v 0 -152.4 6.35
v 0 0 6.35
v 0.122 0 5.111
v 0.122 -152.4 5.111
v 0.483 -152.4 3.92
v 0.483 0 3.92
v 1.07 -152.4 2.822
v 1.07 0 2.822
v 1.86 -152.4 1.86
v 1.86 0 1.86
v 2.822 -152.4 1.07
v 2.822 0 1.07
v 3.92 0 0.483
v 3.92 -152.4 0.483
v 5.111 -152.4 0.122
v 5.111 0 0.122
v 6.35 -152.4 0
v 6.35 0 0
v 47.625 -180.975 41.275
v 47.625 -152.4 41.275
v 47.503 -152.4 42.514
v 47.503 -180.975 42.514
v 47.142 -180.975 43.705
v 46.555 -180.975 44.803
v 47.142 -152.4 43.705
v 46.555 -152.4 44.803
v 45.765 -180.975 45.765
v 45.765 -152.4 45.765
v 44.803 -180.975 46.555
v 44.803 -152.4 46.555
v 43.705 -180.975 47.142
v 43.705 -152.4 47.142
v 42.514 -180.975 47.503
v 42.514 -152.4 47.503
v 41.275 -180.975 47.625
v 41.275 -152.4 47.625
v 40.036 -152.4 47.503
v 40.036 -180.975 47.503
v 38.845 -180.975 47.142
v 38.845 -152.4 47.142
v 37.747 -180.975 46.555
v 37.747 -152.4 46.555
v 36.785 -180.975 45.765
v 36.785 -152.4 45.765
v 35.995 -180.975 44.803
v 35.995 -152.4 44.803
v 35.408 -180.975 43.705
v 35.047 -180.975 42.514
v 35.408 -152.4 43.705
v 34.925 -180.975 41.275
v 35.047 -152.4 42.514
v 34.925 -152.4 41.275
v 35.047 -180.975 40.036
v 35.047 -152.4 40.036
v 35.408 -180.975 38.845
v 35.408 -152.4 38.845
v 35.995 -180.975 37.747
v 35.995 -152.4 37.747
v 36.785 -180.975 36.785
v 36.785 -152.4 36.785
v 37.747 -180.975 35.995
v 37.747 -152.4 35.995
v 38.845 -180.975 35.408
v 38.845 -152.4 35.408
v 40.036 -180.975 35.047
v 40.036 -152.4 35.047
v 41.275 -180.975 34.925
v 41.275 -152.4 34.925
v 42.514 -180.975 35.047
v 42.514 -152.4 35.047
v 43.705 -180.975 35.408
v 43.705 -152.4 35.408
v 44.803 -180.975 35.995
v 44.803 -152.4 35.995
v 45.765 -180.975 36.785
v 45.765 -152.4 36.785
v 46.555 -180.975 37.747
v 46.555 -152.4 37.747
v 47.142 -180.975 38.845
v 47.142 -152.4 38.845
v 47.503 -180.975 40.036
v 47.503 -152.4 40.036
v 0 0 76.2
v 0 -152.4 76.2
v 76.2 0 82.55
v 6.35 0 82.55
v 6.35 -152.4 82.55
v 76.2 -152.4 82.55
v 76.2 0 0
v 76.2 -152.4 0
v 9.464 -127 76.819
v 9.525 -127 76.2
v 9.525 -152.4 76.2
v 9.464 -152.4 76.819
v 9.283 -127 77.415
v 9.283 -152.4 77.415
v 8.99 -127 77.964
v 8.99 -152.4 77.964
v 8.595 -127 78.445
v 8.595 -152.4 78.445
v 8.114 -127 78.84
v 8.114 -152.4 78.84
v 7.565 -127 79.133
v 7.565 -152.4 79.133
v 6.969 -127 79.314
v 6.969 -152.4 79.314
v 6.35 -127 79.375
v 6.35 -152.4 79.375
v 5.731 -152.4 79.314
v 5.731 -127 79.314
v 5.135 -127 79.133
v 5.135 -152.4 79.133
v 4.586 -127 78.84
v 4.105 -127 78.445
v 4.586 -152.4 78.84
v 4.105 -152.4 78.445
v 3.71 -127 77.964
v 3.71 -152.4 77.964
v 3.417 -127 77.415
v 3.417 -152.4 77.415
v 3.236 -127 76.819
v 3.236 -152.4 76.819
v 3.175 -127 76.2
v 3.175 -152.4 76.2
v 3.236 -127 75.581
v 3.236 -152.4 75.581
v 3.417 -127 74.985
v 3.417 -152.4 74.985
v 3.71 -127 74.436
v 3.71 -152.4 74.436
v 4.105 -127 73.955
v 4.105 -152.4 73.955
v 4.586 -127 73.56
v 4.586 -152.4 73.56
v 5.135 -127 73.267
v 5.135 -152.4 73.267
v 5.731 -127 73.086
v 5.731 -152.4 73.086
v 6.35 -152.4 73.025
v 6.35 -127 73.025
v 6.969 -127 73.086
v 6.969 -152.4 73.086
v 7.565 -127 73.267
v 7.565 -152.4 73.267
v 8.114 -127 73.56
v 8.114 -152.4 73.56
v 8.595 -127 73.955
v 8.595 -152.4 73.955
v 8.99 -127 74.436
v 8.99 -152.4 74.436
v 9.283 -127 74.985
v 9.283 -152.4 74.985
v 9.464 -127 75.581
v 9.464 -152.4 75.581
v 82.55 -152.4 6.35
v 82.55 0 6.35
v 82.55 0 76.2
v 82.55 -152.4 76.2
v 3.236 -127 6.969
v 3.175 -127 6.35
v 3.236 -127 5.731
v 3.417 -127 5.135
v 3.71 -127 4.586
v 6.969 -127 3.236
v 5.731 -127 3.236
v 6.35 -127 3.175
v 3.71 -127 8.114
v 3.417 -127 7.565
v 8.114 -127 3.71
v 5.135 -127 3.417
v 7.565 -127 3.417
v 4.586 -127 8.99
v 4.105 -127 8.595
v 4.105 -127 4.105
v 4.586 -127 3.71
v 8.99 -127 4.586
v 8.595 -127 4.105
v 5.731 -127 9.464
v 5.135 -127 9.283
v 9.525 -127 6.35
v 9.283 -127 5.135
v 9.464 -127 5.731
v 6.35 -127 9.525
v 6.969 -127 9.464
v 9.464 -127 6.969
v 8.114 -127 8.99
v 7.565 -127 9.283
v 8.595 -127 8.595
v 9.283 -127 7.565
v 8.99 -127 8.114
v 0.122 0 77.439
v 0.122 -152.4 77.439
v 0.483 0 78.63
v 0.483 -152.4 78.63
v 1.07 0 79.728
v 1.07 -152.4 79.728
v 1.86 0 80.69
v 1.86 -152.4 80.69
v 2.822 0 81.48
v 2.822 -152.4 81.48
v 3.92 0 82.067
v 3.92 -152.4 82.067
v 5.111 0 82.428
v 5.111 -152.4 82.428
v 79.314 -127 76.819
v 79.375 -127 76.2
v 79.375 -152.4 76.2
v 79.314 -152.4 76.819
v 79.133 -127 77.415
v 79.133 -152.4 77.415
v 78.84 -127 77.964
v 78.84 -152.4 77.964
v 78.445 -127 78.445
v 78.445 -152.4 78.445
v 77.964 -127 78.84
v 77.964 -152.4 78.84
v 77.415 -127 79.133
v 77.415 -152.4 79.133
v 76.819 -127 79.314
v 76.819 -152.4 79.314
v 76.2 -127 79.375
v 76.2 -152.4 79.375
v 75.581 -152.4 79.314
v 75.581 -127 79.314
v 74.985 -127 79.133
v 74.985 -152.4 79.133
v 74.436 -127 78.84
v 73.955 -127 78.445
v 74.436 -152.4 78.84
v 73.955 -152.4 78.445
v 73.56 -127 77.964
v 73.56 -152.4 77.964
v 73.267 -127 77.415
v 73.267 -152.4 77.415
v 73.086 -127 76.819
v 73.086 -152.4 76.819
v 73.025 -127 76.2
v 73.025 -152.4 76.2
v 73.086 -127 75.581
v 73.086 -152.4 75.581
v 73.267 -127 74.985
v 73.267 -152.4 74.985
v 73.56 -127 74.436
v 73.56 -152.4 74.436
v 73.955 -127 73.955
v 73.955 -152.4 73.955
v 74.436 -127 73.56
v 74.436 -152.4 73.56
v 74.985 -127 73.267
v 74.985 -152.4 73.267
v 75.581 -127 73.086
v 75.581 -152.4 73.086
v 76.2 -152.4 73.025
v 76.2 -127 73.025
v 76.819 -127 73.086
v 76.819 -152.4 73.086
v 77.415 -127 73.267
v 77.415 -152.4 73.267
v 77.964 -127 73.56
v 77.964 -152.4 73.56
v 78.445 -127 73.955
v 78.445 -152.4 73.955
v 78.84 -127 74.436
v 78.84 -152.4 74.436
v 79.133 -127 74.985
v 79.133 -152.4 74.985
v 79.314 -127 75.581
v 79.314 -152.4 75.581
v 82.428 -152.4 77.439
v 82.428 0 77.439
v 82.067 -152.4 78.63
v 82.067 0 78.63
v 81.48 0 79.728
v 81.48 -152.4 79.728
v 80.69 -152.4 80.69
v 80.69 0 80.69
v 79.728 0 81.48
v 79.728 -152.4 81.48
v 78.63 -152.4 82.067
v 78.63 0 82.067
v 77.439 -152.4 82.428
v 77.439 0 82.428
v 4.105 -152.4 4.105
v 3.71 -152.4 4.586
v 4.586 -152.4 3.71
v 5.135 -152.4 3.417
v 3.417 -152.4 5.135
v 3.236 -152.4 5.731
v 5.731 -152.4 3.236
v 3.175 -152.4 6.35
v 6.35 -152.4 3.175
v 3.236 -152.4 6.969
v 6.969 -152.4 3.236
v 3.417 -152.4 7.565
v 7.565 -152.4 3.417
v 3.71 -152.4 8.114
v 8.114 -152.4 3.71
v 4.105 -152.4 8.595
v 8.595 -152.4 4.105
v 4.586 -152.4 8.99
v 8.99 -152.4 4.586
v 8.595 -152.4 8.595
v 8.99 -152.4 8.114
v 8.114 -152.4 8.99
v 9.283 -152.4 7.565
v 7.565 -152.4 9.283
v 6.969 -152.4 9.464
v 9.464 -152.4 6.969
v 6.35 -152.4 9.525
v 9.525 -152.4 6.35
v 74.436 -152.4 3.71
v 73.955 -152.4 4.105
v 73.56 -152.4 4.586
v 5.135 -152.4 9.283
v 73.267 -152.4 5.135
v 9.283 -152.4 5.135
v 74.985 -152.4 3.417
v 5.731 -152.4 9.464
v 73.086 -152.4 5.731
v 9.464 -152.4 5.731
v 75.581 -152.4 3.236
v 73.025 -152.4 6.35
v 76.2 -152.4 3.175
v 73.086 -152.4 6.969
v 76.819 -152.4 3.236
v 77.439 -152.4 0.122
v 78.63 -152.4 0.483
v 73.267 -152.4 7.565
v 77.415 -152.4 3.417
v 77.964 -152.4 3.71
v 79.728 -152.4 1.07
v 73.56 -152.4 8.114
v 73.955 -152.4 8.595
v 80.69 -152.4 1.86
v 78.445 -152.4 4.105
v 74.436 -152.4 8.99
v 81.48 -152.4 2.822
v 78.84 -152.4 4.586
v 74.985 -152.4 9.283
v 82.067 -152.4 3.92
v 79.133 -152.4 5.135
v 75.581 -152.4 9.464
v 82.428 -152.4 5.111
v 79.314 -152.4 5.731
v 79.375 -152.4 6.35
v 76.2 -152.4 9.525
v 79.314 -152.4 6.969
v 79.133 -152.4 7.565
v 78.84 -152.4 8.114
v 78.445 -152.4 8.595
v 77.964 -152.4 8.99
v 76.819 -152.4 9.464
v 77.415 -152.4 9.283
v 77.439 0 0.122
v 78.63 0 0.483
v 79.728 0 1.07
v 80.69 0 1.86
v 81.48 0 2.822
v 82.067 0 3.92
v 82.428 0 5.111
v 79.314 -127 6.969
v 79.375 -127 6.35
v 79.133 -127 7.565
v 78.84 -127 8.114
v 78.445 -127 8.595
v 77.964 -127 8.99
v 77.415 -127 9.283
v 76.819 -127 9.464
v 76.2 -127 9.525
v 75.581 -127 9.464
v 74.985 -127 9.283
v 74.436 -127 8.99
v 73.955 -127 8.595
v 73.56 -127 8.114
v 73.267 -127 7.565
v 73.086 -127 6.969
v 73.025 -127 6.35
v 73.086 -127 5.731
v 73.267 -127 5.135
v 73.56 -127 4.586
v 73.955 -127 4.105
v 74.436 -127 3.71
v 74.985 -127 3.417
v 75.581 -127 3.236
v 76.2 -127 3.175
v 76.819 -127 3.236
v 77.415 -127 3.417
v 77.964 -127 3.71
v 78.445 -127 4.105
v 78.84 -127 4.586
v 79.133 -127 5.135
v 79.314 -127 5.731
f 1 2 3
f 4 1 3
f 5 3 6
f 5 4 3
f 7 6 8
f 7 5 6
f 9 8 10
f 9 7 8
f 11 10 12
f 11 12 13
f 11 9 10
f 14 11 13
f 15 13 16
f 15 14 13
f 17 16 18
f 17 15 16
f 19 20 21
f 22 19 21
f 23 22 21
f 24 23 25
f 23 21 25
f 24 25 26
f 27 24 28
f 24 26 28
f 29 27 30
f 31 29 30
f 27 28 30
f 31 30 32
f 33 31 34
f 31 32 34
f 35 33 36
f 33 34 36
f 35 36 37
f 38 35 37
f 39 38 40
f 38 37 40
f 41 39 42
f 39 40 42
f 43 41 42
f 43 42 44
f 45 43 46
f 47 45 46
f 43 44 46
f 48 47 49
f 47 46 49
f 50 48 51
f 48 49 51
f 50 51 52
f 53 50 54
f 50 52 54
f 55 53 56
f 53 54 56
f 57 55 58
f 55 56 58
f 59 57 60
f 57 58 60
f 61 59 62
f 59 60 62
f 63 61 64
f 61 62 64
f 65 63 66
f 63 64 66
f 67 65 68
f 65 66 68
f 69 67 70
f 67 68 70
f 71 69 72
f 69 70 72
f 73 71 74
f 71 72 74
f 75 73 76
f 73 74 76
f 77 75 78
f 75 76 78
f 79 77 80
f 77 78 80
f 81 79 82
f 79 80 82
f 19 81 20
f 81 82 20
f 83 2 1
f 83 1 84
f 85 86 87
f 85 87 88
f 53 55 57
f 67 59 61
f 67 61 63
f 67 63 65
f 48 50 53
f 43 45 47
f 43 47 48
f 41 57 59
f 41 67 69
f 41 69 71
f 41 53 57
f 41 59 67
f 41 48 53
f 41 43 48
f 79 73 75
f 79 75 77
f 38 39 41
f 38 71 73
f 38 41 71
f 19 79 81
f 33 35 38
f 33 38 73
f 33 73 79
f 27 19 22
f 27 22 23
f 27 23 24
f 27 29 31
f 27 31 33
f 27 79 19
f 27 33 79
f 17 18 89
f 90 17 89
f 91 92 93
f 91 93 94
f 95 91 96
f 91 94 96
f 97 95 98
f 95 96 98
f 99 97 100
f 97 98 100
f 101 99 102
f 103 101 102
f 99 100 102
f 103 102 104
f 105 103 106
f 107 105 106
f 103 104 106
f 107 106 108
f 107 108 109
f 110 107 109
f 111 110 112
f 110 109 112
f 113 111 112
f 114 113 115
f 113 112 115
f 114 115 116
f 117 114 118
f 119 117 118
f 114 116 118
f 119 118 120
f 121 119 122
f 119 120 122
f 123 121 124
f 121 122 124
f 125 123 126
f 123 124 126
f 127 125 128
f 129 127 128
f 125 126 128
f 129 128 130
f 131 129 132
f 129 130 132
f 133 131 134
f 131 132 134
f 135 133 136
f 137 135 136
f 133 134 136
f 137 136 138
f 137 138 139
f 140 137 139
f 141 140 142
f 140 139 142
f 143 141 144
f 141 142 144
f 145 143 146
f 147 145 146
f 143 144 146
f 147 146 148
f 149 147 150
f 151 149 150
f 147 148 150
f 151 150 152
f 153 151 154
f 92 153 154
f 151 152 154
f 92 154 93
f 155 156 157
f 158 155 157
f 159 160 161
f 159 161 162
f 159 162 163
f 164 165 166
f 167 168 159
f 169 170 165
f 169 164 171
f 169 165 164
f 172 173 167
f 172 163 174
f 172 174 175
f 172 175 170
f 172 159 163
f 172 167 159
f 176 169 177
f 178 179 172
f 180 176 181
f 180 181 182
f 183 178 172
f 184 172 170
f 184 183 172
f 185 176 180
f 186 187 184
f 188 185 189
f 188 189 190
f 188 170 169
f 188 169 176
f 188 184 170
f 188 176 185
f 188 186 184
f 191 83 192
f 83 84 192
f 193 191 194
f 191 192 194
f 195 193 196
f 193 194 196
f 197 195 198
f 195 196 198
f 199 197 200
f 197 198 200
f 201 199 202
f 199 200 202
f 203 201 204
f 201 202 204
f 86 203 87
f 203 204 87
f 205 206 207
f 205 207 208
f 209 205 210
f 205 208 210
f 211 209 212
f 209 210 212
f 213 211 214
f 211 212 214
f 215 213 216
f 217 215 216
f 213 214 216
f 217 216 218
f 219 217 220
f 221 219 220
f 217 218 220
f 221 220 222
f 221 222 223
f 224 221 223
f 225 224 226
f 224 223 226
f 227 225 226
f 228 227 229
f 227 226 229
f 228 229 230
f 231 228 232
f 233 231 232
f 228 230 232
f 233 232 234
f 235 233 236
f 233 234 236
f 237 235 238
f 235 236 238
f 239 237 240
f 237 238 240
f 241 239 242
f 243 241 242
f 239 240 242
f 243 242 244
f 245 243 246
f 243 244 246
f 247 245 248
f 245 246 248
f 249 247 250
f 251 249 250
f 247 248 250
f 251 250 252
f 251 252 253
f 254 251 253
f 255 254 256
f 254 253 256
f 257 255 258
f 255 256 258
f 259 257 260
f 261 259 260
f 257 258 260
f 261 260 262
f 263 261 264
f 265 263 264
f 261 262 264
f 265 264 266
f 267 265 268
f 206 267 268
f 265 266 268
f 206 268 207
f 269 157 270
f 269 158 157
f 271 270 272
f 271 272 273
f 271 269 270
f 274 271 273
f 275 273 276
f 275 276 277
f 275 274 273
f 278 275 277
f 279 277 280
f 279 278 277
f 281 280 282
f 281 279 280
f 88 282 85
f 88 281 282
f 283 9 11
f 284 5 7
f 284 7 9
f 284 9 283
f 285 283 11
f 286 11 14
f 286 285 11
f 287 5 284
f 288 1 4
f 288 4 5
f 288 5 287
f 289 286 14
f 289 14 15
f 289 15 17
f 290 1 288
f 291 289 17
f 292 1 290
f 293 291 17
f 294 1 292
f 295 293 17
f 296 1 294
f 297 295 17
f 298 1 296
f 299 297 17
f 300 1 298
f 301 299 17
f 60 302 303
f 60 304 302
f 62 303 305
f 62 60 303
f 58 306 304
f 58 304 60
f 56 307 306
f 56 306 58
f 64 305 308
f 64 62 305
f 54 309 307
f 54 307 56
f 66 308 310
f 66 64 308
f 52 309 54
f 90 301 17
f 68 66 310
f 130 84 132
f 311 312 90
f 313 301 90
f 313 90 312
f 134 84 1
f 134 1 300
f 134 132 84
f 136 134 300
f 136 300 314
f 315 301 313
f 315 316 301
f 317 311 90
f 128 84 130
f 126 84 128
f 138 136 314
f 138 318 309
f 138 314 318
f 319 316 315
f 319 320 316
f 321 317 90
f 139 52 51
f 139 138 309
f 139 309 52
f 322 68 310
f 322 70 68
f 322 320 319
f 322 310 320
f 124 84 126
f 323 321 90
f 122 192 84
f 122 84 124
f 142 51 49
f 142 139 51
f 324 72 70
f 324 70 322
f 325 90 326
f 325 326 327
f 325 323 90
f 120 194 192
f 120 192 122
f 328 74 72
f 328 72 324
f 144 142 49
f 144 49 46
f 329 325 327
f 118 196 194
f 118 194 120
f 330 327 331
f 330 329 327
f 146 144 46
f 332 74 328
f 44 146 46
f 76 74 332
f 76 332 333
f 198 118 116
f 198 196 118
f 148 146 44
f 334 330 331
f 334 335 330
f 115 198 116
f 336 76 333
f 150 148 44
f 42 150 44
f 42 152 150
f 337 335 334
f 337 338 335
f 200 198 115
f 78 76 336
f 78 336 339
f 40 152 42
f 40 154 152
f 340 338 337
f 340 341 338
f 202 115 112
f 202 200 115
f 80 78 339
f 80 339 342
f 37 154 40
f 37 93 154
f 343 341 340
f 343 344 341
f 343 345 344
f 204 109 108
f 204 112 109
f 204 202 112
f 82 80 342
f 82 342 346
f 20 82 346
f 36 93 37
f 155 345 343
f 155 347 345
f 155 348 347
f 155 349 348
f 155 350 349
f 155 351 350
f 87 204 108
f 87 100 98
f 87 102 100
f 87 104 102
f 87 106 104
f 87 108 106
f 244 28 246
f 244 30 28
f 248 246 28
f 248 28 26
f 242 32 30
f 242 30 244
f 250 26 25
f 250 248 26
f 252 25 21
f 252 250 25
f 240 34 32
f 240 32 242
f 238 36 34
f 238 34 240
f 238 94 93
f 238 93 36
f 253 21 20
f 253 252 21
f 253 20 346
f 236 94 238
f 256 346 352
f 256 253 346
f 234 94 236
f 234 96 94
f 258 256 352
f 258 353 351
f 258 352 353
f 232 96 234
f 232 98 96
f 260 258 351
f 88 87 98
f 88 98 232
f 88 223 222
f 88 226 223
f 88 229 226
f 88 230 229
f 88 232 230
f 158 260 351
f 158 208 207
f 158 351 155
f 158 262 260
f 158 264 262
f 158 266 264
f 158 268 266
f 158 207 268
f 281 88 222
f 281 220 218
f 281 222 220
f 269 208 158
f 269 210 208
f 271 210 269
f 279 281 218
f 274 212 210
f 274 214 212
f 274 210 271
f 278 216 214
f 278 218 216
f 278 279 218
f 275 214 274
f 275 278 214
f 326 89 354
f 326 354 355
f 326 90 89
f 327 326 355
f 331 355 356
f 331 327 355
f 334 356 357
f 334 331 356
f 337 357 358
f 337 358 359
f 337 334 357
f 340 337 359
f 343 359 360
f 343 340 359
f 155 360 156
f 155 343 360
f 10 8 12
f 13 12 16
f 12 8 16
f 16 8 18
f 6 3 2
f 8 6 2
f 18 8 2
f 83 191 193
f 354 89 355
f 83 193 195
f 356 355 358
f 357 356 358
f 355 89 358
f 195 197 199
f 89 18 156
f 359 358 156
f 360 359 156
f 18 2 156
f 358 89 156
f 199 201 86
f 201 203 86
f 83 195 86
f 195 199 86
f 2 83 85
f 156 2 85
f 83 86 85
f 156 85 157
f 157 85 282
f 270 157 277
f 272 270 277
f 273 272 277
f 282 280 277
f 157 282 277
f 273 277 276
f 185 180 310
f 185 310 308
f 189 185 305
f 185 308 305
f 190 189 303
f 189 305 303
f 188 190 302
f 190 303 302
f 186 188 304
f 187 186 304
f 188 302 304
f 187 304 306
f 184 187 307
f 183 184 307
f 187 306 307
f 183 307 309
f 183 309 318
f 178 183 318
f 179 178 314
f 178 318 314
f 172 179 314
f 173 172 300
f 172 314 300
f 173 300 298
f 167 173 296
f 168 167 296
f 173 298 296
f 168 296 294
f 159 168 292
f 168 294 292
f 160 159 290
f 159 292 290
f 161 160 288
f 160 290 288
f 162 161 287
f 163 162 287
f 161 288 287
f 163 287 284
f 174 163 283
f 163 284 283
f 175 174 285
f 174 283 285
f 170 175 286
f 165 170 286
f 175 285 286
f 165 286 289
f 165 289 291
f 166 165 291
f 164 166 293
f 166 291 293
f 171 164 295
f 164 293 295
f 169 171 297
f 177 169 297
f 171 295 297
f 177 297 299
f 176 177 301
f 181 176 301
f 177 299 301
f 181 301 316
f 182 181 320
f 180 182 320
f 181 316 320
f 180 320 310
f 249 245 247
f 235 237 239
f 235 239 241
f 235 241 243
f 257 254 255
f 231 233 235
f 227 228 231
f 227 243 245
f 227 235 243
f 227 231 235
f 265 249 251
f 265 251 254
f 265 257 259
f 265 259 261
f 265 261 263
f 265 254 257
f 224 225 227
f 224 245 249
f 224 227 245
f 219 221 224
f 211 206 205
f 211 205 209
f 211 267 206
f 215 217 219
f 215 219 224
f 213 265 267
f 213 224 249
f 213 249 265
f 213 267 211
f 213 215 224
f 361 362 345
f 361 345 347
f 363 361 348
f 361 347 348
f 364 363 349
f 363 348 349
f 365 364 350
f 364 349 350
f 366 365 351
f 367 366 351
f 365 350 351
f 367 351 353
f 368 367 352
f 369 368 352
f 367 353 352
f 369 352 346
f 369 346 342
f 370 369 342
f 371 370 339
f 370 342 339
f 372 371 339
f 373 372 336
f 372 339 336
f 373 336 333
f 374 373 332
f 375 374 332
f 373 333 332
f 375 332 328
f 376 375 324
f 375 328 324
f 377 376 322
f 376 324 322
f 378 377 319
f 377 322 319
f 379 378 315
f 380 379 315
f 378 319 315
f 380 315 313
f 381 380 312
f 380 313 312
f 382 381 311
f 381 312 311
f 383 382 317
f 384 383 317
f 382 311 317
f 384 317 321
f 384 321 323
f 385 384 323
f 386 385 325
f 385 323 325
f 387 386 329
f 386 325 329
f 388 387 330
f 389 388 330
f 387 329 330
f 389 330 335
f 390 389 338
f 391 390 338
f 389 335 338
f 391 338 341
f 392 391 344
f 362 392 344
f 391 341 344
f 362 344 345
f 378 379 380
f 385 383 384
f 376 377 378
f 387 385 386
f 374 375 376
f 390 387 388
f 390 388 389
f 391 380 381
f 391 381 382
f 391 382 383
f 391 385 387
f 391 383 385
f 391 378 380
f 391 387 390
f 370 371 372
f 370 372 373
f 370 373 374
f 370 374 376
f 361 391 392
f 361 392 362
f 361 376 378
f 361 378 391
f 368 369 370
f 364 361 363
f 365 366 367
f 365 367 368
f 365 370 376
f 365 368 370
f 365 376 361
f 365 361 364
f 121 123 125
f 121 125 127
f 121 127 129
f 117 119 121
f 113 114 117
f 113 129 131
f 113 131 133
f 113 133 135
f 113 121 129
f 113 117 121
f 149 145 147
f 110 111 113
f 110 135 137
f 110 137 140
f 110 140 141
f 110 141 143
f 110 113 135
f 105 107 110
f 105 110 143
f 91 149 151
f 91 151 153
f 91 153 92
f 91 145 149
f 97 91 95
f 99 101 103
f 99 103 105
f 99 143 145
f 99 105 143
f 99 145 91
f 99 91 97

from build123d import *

# Parameters (mm, degrees)
F0_W     = 82.55
F0_H     = 82.55
F1_DEPTH = 152.4
F2_R     = 6.35
F3_R     = 6.35
F4_DEPTH = 28.575
F5_R     = 3.175
F6_DEPTH = 25.4


with BuildPart() as f1:
    # F0 (on Front) → F1 (new body)
    with BuildSketch(Plane.XZ):
        with Locations((41.275, 41.275)):
            Rectangle(F0_W, F0_H)
    extrude(amount=F1_DEPTH)

    # F2
    f2_edges = [f1.edges().sort_by_distance(p)[0] for p in [
        (0, -76.2, 82.55),
        (0, -76.2, 0),
        (82.55, -76.2, 82.55),
        (82.55, -76.2, 0),
    ]]
    fillet(f2_edges, radius=F2_R)

    # F3 (on face) → F4 (join)
    with BuildSketch(Plane.XZ.offset(152.4)):
        with Locations((41.275, 41.275)):
            Circle(F3_R)
    extrude(amount=F4_DEPTH)

    # F5 (on face) → F6 (cut)
    with BuildSketch(Plane.XZ.offset(152.4)):
        with Locations((6.35, 76.2)):
            Circle(F5_R)
        with Locations((6.35, 6.35)):
            Circle(F5_R)
        with Locations((76.2, 76.2)):
            Circle(F5_R)
        with Locations((76.2, 6.35)):
            Circle(F5_R)
    extrude(amount=-F6_DEPTH, mode=Mode.SUBTRACT)


solid = f1.part
